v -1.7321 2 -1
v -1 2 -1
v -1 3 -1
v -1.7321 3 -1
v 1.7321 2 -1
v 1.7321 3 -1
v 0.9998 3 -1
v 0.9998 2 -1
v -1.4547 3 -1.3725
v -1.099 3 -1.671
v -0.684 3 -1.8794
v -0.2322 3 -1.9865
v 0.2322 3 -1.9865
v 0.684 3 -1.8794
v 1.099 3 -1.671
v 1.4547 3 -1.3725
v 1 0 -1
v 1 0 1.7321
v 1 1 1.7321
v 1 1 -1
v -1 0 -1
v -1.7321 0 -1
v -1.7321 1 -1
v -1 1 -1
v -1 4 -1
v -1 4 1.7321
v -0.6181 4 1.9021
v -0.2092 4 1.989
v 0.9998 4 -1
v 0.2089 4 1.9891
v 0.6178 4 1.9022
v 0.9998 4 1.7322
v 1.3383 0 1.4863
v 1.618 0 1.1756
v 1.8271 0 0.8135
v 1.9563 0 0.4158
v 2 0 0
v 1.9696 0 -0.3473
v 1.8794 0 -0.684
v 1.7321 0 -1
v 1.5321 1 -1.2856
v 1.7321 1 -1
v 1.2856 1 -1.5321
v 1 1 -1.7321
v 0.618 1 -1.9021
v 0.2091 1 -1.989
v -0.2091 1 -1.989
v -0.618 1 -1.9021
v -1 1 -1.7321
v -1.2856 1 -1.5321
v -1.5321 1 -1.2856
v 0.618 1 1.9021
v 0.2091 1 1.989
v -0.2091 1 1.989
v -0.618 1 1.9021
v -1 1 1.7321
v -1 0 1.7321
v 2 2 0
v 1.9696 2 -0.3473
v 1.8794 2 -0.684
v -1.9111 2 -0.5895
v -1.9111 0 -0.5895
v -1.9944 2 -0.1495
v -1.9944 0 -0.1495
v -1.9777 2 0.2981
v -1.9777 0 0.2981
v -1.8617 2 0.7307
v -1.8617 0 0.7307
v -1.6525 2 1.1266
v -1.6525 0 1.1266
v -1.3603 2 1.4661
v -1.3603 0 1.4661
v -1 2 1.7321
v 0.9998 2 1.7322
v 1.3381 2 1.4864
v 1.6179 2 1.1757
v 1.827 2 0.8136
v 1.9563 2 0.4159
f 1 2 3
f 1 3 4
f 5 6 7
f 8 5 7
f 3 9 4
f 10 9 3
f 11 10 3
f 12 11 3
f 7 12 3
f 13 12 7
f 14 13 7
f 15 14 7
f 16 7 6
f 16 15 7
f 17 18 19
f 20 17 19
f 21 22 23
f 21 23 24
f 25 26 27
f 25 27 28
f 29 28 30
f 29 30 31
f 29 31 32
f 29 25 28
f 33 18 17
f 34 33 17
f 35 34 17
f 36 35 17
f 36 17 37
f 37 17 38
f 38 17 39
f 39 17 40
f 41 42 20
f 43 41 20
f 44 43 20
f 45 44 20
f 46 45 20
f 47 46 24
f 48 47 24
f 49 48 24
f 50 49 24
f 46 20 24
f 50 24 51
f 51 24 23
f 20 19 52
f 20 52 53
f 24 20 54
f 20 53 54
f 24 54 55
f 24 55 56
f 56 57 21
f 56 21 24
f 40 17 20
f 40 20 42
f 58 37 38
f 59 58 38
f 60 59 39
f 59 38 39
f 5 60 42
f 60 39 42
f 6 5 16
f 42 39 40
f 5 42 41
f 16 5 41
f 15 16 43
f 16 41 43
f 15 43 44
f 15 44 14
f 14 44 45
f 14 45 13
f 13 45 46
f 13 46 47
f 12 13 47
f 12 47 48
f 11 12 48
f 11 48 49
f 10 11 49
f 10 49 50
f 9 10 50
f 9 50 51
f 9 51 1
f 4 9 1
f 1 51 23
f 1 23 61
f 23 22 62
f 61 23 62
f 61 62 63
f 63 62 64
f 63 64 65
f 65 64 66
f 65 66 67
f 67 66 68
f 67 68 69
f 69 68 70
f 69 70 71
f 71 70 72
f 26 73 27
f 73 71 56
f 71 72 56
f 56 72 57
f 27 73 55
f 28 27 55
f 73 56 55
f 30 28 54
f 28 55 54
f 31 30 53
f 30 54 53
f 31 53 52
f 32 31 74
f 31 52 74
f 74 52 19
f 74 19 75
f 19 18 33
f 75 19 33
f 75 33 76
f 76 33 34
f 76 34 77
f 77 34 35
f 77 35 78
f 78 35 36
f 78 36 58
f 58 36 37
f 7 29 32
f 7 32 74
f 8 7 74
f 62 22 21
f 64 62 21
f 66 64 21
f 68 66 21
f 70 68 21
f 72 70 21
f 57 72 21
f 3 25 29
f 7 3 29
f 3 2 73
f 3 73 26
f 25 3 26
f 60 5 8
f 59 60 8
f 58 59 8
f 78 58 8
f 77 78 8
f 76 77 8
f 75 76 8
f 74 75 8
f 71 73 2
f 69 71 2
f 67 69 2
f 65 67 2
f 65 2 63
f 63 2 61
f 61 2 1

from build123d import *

# Parameters (mm, degrees)
SKETCH1_R               = 2
BOSS_EXTRUDE1_DEPTH     = 4
SKETCH2_W               = 2
SKETCH2_H               = 1
CUT_EXTRUDE1_DEPTH      = 2
CUT_EXTRUDE2_DEPTH      = 4
CUT_EXTRUDE2_DEPTH_BACK = 1
CUT_EXTRUDE3_DEPTH      = 1
CUT_EXTRUDE4_DEPTH      = 1


with BuildPart() as part:
    # Sketch1 → Boss-Extrude1 (new body)
    with BuildSketch(Plane(origin=(0, 0, 0), x_dir=(1, 0, 0), z_dir=(0, 1, 0))):
        Circle(SKETCH1_R)
    extrude(amount=BOSS_EXTRUDE1_DEPTH)

    # Sketch2 → Cut-Extrude1 (cut, symmetric)
    with BuildSketch(Plane.XY):
        with Locations((0, 0.5)):
            Rectangle(SKETCH2_W, SKETCH2_H)
    extrude(amount=CUT_EXTRUDE1_DEPTH, both=True, mode=Mode.SUBTRACT)

    # Sketch3 → Cut-Extrude2 (cut, two sides)
    with BuildSketch(Plane.XY) as cut_extrude2_sk:
        Polygon((2, 4), (2, 3), (2, 2), (0.999776138, 2), (0.999776138, 3), (0.999776138, 4), align=None)
        Polygon((-1, 2), (-2, 2), (-2, 4), (-1, 4), (-1, 3), align=None)
    extrude(amount=CUT_EXTRUDE2_DEPTH, mode=Mode.SUBTRACT)
    extrude(cut_extrude2_sk.sketch, amount=-CUT_EXTRUDE2_DEPTH_BACK, mode=Mode.SUBTRACT)

    # Sketch4 → Cut-Extrude3 (cut)
    with BuildSketch(Plane(origin=(0, 4, 0), x_dir=(1, 0, 0), z_dir=(0, 1, 0))):
        with BuildLine():
            Line((-1.732050808, 1), (1.732050808, 1))
            ThreePointArc((1.732050808, 1), (0, 2), (-1.732050808, 1))
        make_face()
    extrude(amount=-CUT_EXTRUDE3_DEPTH, mode=Mode.SUBTRACT)

    # Sketch5 → Cut-Extrude4 (cut)
    with BuildSketch(Plane.XZ):
        with BuildLine():
            Line((-1.732050808, -1), (1.732050808, -1))
            ThreePointArc((1.732050808, -1), (0, -2), (-1.732050808, -1))
        make_face()
    extrude(amount=-CUT_EXTRUDE4_DEPTH, mode=Mode.SUBTRACT)


solid = part.part
